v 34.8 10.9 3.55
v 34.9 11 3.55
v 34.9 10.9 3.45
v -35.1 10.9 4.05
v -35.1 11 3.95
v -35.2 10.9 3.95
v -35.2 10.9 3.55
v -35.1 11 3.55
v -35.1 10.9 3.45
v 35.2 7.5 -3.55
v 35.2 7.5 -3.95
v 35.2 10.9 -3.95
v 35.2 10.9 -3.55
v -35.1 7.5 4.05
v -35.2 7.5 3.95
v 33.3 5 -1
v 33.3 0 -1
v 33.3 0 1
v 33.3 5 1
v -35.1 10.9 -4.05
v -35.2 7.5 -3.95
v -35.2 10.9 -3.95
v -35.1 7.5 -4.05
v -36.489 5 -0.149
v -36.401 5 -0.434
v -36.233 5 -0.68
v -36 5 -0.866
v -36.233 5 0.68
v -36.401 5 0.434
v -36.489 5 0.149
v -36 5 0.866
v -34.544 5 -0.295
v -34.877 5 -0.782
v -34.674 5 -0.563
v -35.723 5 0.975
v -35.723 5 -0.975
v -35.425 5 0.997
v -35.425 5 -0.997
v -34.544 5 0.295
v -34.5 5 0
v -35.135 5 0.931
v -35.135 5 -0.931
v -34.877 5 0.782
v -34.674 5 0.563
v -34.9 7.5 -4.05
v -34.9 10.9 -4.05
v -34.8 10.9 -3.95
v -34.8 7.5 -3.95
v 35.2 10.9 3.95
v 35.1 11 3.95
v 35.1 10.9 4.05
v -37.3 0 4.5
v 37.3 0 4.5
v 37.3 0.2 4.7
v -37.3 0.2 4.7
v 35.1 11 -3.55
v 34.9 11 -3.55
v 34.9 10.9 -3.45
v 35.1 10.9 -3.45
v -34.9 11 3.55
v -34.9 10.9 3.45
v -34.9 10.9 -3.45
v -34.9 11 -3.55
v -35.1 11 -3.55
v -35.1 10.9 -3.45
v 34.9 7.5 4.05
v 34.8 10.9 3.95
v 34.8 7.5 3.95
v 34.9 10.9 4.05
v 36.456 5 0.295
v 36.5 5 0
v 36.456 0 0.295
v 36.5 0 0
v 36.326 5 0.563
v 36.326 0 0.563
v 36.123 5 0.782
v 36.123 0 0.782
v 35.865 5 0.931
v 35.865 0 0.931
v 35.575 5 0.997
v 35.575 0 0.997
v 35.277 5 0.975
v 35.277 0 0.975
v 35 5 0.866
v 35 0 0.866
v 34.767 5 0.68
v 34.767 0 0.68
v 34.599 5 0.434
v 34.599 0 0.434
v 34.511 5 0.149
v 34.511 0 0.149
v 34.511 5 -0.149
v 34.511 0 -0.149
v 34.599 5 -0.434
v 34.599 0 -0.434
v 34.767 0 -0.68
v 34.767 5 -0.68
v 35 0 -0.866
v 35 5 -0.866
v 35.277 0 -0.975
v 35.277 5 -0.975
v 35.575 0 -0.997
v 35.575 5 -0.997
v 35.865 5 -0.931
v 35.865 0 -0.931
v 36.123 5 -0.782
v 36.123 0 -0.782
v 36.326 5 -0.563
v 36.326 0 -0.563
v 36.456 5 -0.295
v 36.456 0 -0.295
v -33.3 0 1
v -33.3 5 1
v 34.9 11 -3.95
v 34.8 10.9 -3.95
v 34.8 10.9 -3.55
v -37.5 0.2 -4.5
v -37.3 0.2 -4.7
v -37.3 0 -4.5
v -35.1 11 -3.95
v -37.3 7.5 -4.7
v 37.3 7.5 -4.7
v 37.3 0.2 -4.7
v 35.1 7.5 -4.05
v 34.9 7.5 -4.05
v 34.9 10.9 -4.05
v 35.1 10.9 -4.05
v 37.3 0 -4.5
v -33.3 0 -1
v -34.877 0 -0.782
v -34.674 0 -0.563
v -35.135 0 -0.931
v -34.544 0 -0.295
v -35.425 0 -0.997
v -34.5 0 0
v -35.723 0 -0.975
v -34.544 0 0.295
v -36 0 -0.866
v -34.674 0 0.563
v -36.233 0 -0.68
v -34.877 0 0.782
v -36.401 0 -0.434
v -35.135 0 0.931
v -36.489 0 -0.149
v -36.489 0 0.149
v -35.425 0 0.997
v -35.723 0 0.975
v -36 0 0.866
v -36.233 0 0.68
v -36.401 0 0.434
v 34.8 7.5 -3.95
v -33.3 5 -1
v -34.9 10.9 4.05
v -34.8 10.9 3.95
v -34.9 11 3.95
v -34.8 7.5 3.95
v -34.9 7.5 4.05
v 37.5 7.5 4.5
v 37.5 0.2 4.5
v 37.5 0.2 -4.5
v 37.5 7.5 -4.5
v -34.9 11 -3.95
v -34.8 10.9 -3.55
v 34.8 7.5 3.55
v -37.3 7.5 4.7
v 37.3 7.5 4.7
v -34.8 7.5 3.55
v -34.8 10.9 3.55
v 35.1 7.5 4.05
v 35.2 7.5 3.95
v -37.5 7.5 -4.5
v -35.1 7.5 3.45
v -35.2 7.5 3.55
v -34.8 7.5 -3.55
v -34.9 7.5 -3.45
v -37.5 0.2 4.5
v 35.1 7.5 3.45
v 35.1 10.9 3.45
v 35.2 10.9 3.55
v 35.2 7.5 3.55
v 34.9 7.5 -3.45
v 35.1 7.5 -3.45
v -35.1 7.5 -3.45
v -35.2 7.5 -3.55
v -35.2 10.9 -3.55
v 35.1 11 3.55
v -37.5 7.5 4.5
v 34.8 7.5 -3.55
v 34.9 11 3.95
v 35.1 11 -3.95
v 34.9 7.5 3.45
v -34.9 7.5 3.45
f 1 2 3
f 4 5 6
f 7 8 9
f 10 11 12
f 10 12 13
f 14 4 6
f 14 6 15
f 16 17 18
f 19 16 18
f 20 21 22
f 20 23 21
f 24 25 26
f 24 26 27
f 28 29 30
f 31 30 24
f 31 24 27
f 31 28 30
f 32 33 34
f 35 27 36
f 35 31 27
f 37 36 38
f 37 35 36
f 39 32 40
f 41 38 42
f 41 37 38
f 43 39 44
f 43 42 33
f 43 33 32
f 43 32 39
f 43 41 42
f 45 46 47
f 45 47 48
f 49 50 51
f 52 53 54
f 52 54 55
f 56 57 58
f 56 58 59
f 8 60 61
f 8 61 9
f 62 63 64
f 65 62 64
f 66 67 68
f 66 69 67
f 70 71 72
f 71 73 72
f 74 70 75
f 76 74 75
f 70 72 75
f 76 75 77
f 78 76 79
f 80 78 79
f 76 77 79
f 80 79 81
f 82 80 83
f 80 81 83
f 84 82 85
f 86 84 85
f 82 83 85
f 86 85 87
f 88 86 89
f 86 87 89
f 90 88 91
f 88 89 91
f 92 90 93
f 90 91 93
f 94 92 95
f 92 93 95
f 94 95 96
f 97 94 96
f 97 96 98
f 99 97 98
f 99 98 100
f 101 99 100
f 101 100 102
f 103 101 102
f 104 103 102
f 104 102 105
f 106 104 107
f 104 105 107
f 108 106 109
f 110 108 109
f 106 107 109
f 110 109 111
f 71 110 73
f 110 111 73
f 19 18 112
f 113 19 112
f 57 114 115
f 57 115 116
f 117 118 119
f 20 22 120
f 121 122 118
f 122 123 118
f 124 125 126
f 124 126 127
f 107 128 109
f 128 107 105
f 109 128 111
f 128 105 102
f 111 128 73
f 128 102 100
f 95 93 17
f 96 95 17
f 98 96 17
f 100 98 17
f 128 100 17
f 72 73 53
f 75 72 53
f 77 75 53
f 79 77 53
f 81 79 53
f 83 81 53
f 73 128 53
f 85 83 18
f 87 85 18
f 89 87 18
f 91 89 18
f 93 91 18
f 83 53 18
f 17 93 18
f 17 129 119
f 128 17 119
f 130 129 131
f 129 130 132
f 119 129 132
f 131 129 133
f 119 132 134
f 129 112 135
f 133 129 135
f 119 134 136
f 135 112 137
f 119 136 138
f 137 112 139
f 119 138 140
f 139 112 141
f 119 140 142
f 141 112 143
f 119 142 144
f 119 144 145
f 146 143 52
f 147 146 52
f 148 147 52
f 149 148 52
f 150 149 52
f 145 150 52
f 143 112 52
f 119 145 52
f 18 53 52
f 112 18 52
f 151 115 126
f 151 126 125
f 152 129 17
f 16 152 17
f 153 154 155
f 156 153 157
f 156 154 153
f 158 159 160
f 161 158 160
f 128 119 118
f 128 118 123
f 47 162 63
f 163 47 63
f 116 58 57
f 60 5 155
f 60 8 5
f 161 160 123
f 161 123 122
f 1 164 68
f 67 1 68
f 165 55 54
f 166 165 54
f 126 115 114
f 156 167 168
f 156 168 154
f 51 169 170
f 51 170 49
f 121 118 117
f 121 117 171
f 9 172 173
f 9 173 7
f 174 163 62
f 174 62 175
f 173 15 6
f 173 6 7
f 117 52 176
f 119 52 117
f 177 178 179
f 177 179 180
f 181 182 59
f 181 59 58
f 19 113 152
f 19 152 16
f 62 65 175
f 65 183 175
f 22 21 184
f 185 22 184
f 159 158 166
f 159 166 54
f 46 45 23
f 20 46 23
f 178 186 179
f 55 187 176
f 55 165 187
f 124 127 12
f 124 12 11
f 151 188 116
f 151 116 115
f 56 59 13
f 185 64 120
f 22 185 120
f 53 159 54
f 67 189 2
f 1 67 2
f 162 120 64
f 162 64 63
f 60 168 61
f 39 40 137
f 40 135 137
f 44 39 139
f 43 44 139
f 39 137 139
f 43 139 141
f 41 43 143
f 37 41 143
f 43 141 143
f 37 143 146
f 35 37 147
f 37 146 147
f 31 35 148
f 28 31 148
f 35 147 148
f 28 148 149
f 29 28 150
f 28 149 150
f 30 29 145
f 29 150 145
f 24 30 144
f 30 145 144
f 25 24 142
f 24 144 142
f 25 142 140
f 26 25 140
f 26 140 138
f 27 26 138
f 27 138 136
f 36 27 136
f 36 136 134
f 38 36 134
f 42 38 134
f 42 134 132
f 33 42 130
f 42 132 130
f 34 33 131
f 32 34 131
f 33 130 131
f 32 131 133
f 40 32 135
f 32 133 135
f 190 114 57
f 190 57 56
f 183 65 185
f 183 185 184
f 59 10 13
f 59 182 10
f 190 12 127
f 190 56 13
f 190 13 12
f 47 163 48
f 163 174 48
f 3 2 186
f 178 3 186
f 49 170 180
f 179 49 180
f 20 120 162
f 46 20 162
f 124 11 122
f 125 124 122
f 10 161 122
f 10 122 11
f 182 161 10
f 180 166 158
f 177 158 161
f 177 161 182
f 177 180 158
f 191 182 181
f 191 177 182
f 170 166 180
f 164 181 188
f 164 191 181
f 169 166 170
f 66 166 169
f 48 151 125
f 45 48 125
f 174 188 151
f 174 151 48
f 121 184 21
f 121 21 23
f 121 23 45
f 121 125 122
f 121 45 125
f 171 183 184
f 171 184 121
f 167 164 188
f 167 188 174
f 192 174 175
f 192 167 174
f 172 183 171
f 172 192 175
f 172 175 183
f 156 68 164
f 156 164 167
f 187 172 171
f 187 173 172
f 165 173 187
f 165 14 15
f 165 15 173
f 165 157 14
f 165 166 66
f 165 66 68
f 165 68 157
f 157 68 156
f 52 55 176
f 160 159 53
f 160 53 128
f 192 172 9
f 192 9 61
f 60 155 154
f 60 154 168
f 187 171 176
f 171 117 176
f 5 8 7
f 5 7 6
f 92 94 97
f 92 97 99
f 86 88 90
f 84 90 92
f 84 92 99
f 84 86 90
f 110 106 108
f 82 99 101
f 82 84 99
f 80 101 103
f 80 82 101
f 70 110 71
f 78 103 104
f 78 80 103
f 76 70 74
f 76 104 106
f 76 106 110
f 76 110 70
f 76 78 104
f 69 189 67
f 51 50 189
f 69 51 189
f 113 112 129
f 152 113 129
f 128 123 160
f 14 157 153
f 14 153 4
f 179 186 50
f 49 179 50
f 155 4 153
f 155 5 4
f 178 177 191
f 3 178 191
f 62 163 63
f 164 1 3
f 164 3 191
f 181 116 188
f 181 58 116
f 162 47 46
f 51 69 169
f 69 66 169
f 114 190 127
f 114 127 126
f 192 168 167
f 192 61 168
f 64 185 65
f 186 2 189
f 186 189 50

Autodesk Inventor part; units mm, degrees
ref_plane "YZ Plane" through (0, 0, 0) normal (1, 0, 0) x (0, 1, 0)
ref_plane "XZ Plane" through (0, 0, 0) normal (0, 1, 0) x (-1, 0, 0)
ref_plane "XY Plane" through (0, 0, 0) normal (0, 0, 1) x (1, 0, 0)
sketch "Sketch3" plane through (0, 0, 0) normal (0, 1, 0) x (-1, 0, 0)
  line L0 (37.5, 4.7) -> (-37.5, 4.7)
  line L1 (-37.5, 4.7) -> (-37.5, -4.7)
  line L2 (-37.5, -4.7) -> (37.5, -4.7)
  line L3 (37.5, -4.7) -> (37.5, 4.7)
  line L4 (37.5, 4.7) -> (-37.5, -4.7) construction
  line L5 (-37.5, 4.7) -> (37.5, -4.7) construction
  point P0 (0, 0)
  dimension "d0" = 75
  dimension "d1" = 9.4
extrude "Extrusion1" add sketch "Sketch3" along normal blind 7.5
sketch "Sketch4" plane through (0, 7.5, 0) normal (0, 1, 0) x (1, 0, 0)
  line L0 (-37.5, 4.7) -> (-37.5, -4.7) projected
  line L1 (-37.5, 0) -> (37.5, 0)
  line L2 (37.5, -4.7) -> (37.5, 4.7) projected
  line L3 (37.5, 4.7) -> (-37.5, 4.7) projected
  line L4 (0, 4.7) -> (0, -4.7)
  line L5 (-37.5, -4.7) -> (37.5, -4.7) projected
  line L6 (-35.2, 3.45) -> (-34.8, 3.45)
  line L7 (-34.8, 3.45) -> (-34.8, 4.05)
  line L8 (-34.8, 4.05) -> (-35.2, 4.05)
  line L9 (-35.2, 4.05) -> (-35.2, 3.45)
  line L10 (-35.2, 3.45) -> (-34.8, 4.05) construction
  line L11 (-34.8, 3.45) -> (-35.2, 4.05) construction
  line L12 (-35.2, -3.45) -> (-34.8, -3.45)
  line L13 (-34.8, -3.45) -> (-34.8, -4.05)
  line L14 (-34.8, -4.05) -> (-35.2, -4.05)
  line L15 (-35.2, -4.05) -> (-35.2, -3.45)
  line L16 (-35.2, -3.45) -> (-34.8, -4.05) construction
  line L17 (-34.8, -3.45) -> (-35.2, -4.05) construction
  line L18 (35.2, 3.45) -> (34.8, 3.45)
  line L19 (34.8, 3.45) -> (34.8, 4.05)
  line L20 (34.8, 4.05) -> (35.2, 4.05)
  line L21 (35.2, 4.05) -> (35.2, 3.45)
  line L22 (35.2, 3.45) -> (34.8, 4.05) construction
  line L23 (34.8, 3.45) -> (35.2, 4.05) construction
  line L24 (35.2, -3.45) -> (34.8, -3.45)
  line L25 (34.8, -3.45) -> (34.8, -4.05)
  line L26 (34.8, -4.05) -> (35.2, -4.05)
  line L27 (35.2, -4.05) -> (35.2, -3.45)
  line L28 (35.2, -3.45) -> (34.8, -4.05) construction
  line L29 (34.8, -3.45) -> (35.2, -4.05) construction
  point P0 (0, 0)
  point P1 (-35, 3.75)
  point P2 (-35, -3.75)
  point P3 (35, 3.75)
  point P4 (35, -3.75)
  dimension "d7" = 0.6
  dimension "d8" = 0.4
  dimension "d9" = 7.5
  dimension "d10" = 70
extrude "Extrusion2" add sketch "Sketch4" along normal blind 3.5 contours L9 L8 L7 L6 | L12 L13 L14 L15 | L18 L19 L20 L21 | L27 L26 L25 L24
sketch "Sketch5" plane through (0, 0, 0) normal (0, -1, 0) x (1, 0, 0)
  line L0 (-33.3, -1) -> (33.3, -1)
  line L1 (33.3, -1) -> (33.3, 1)
  line L2 (33.3, 1) -> (-33.3, 1)
  line L3 (-33.3, 1) -> (-33.3, -1)
  line L4 (-33.3, -1) -> (33.3, 1) construction
  line L5 (33.3, -1) -> (-33.3, 1) construction
  point P0 (0, 0)
  dimension "d13" = 66.6
  dimension "d14" = 2
extrude "Extrusion3" cut sketch "Sketch5" against normal blind 5
sketch "Sketch6" plane through (0, 0, 0) normal (0, -1, 0) x (1, 0, 0)
  circle A0 centre (-35.5, 0) radius 1
  line L0 (37.5, -4.7) -> (-37.5, -4.7) projected
  line L1 (0, -4.7) -> (0, 4.7)
  line L2 (-37.5, 4.7) -> (37.5, 4.7) projected
  circle A1 centre (35.5, 0) radius 1
  point P0 (0, 0)
  point P1 (0, 0)
  dimension "d17" = 2
  dimension "d18" = 71
extrude "Extrusion4" cut sketch "Sketch6" against normal blind 5
thread "Thread1" size "M2x0.4" class "6H" standard "ANSI Metric M Profile" length 5
thread "Thread2" size "M2x0.4" class "6H" standard "ANSI Metric M Profile" length 5
chamfer "Chamfer1" distance 0.2 angle 45 8 edges at (-37.5, 3.75, -4.7) (-37.5, 3.75, 4.7) (37.5, 3.75, -4.7) (37.5, 3.75, 4.7) (0, 0, -4.7) (37.5, 0, 0) (0, 0, 4.7) (-37.5, 0, 0)
chamfer "Chamfer2" distance 0.1 angle 45 32 edges at (-34.8, 9.25, -3.45) (-35.2, 9.25, -3.45) (-34.8, 9.25, -4.05) (-35.2, 9.25, -4.05) (-35.2, 11, -3.75) (-34.8, 11, -3.75) (-35, 11, -4.05) (-35, 11, -3.45) (-34.8, 9.25, 4.05) (-34.8, 11, 3.75) (-35, 11, 4.05) (-35.2, 11, 3.75) (-35.2, 9.25, 4.05) (-34.8, 9.25, 3.45) (-35, 11, 3.45) (-35.2, 9.25, 3.45) (34.8, 11, 3.75) (35, 11, 4.05) (35.2, 11, 3.75) (34.8, 9.25, 4.05) (35.2, 9.25, 4.05) (35, 11, 3.45) (34.8, 9.25, 3.45) (35.2, 9.25, 3.45) (34.8, 9.25, -3.45) (35, 11, -3.45) (35.2, 9.25, -3.45) (34.8, 11, -3.75) (34.8, 9.25, -4.05) (35.2, 11, -3.75) (35.2, 9.25, -4.05) (35, 11, -4.05)
